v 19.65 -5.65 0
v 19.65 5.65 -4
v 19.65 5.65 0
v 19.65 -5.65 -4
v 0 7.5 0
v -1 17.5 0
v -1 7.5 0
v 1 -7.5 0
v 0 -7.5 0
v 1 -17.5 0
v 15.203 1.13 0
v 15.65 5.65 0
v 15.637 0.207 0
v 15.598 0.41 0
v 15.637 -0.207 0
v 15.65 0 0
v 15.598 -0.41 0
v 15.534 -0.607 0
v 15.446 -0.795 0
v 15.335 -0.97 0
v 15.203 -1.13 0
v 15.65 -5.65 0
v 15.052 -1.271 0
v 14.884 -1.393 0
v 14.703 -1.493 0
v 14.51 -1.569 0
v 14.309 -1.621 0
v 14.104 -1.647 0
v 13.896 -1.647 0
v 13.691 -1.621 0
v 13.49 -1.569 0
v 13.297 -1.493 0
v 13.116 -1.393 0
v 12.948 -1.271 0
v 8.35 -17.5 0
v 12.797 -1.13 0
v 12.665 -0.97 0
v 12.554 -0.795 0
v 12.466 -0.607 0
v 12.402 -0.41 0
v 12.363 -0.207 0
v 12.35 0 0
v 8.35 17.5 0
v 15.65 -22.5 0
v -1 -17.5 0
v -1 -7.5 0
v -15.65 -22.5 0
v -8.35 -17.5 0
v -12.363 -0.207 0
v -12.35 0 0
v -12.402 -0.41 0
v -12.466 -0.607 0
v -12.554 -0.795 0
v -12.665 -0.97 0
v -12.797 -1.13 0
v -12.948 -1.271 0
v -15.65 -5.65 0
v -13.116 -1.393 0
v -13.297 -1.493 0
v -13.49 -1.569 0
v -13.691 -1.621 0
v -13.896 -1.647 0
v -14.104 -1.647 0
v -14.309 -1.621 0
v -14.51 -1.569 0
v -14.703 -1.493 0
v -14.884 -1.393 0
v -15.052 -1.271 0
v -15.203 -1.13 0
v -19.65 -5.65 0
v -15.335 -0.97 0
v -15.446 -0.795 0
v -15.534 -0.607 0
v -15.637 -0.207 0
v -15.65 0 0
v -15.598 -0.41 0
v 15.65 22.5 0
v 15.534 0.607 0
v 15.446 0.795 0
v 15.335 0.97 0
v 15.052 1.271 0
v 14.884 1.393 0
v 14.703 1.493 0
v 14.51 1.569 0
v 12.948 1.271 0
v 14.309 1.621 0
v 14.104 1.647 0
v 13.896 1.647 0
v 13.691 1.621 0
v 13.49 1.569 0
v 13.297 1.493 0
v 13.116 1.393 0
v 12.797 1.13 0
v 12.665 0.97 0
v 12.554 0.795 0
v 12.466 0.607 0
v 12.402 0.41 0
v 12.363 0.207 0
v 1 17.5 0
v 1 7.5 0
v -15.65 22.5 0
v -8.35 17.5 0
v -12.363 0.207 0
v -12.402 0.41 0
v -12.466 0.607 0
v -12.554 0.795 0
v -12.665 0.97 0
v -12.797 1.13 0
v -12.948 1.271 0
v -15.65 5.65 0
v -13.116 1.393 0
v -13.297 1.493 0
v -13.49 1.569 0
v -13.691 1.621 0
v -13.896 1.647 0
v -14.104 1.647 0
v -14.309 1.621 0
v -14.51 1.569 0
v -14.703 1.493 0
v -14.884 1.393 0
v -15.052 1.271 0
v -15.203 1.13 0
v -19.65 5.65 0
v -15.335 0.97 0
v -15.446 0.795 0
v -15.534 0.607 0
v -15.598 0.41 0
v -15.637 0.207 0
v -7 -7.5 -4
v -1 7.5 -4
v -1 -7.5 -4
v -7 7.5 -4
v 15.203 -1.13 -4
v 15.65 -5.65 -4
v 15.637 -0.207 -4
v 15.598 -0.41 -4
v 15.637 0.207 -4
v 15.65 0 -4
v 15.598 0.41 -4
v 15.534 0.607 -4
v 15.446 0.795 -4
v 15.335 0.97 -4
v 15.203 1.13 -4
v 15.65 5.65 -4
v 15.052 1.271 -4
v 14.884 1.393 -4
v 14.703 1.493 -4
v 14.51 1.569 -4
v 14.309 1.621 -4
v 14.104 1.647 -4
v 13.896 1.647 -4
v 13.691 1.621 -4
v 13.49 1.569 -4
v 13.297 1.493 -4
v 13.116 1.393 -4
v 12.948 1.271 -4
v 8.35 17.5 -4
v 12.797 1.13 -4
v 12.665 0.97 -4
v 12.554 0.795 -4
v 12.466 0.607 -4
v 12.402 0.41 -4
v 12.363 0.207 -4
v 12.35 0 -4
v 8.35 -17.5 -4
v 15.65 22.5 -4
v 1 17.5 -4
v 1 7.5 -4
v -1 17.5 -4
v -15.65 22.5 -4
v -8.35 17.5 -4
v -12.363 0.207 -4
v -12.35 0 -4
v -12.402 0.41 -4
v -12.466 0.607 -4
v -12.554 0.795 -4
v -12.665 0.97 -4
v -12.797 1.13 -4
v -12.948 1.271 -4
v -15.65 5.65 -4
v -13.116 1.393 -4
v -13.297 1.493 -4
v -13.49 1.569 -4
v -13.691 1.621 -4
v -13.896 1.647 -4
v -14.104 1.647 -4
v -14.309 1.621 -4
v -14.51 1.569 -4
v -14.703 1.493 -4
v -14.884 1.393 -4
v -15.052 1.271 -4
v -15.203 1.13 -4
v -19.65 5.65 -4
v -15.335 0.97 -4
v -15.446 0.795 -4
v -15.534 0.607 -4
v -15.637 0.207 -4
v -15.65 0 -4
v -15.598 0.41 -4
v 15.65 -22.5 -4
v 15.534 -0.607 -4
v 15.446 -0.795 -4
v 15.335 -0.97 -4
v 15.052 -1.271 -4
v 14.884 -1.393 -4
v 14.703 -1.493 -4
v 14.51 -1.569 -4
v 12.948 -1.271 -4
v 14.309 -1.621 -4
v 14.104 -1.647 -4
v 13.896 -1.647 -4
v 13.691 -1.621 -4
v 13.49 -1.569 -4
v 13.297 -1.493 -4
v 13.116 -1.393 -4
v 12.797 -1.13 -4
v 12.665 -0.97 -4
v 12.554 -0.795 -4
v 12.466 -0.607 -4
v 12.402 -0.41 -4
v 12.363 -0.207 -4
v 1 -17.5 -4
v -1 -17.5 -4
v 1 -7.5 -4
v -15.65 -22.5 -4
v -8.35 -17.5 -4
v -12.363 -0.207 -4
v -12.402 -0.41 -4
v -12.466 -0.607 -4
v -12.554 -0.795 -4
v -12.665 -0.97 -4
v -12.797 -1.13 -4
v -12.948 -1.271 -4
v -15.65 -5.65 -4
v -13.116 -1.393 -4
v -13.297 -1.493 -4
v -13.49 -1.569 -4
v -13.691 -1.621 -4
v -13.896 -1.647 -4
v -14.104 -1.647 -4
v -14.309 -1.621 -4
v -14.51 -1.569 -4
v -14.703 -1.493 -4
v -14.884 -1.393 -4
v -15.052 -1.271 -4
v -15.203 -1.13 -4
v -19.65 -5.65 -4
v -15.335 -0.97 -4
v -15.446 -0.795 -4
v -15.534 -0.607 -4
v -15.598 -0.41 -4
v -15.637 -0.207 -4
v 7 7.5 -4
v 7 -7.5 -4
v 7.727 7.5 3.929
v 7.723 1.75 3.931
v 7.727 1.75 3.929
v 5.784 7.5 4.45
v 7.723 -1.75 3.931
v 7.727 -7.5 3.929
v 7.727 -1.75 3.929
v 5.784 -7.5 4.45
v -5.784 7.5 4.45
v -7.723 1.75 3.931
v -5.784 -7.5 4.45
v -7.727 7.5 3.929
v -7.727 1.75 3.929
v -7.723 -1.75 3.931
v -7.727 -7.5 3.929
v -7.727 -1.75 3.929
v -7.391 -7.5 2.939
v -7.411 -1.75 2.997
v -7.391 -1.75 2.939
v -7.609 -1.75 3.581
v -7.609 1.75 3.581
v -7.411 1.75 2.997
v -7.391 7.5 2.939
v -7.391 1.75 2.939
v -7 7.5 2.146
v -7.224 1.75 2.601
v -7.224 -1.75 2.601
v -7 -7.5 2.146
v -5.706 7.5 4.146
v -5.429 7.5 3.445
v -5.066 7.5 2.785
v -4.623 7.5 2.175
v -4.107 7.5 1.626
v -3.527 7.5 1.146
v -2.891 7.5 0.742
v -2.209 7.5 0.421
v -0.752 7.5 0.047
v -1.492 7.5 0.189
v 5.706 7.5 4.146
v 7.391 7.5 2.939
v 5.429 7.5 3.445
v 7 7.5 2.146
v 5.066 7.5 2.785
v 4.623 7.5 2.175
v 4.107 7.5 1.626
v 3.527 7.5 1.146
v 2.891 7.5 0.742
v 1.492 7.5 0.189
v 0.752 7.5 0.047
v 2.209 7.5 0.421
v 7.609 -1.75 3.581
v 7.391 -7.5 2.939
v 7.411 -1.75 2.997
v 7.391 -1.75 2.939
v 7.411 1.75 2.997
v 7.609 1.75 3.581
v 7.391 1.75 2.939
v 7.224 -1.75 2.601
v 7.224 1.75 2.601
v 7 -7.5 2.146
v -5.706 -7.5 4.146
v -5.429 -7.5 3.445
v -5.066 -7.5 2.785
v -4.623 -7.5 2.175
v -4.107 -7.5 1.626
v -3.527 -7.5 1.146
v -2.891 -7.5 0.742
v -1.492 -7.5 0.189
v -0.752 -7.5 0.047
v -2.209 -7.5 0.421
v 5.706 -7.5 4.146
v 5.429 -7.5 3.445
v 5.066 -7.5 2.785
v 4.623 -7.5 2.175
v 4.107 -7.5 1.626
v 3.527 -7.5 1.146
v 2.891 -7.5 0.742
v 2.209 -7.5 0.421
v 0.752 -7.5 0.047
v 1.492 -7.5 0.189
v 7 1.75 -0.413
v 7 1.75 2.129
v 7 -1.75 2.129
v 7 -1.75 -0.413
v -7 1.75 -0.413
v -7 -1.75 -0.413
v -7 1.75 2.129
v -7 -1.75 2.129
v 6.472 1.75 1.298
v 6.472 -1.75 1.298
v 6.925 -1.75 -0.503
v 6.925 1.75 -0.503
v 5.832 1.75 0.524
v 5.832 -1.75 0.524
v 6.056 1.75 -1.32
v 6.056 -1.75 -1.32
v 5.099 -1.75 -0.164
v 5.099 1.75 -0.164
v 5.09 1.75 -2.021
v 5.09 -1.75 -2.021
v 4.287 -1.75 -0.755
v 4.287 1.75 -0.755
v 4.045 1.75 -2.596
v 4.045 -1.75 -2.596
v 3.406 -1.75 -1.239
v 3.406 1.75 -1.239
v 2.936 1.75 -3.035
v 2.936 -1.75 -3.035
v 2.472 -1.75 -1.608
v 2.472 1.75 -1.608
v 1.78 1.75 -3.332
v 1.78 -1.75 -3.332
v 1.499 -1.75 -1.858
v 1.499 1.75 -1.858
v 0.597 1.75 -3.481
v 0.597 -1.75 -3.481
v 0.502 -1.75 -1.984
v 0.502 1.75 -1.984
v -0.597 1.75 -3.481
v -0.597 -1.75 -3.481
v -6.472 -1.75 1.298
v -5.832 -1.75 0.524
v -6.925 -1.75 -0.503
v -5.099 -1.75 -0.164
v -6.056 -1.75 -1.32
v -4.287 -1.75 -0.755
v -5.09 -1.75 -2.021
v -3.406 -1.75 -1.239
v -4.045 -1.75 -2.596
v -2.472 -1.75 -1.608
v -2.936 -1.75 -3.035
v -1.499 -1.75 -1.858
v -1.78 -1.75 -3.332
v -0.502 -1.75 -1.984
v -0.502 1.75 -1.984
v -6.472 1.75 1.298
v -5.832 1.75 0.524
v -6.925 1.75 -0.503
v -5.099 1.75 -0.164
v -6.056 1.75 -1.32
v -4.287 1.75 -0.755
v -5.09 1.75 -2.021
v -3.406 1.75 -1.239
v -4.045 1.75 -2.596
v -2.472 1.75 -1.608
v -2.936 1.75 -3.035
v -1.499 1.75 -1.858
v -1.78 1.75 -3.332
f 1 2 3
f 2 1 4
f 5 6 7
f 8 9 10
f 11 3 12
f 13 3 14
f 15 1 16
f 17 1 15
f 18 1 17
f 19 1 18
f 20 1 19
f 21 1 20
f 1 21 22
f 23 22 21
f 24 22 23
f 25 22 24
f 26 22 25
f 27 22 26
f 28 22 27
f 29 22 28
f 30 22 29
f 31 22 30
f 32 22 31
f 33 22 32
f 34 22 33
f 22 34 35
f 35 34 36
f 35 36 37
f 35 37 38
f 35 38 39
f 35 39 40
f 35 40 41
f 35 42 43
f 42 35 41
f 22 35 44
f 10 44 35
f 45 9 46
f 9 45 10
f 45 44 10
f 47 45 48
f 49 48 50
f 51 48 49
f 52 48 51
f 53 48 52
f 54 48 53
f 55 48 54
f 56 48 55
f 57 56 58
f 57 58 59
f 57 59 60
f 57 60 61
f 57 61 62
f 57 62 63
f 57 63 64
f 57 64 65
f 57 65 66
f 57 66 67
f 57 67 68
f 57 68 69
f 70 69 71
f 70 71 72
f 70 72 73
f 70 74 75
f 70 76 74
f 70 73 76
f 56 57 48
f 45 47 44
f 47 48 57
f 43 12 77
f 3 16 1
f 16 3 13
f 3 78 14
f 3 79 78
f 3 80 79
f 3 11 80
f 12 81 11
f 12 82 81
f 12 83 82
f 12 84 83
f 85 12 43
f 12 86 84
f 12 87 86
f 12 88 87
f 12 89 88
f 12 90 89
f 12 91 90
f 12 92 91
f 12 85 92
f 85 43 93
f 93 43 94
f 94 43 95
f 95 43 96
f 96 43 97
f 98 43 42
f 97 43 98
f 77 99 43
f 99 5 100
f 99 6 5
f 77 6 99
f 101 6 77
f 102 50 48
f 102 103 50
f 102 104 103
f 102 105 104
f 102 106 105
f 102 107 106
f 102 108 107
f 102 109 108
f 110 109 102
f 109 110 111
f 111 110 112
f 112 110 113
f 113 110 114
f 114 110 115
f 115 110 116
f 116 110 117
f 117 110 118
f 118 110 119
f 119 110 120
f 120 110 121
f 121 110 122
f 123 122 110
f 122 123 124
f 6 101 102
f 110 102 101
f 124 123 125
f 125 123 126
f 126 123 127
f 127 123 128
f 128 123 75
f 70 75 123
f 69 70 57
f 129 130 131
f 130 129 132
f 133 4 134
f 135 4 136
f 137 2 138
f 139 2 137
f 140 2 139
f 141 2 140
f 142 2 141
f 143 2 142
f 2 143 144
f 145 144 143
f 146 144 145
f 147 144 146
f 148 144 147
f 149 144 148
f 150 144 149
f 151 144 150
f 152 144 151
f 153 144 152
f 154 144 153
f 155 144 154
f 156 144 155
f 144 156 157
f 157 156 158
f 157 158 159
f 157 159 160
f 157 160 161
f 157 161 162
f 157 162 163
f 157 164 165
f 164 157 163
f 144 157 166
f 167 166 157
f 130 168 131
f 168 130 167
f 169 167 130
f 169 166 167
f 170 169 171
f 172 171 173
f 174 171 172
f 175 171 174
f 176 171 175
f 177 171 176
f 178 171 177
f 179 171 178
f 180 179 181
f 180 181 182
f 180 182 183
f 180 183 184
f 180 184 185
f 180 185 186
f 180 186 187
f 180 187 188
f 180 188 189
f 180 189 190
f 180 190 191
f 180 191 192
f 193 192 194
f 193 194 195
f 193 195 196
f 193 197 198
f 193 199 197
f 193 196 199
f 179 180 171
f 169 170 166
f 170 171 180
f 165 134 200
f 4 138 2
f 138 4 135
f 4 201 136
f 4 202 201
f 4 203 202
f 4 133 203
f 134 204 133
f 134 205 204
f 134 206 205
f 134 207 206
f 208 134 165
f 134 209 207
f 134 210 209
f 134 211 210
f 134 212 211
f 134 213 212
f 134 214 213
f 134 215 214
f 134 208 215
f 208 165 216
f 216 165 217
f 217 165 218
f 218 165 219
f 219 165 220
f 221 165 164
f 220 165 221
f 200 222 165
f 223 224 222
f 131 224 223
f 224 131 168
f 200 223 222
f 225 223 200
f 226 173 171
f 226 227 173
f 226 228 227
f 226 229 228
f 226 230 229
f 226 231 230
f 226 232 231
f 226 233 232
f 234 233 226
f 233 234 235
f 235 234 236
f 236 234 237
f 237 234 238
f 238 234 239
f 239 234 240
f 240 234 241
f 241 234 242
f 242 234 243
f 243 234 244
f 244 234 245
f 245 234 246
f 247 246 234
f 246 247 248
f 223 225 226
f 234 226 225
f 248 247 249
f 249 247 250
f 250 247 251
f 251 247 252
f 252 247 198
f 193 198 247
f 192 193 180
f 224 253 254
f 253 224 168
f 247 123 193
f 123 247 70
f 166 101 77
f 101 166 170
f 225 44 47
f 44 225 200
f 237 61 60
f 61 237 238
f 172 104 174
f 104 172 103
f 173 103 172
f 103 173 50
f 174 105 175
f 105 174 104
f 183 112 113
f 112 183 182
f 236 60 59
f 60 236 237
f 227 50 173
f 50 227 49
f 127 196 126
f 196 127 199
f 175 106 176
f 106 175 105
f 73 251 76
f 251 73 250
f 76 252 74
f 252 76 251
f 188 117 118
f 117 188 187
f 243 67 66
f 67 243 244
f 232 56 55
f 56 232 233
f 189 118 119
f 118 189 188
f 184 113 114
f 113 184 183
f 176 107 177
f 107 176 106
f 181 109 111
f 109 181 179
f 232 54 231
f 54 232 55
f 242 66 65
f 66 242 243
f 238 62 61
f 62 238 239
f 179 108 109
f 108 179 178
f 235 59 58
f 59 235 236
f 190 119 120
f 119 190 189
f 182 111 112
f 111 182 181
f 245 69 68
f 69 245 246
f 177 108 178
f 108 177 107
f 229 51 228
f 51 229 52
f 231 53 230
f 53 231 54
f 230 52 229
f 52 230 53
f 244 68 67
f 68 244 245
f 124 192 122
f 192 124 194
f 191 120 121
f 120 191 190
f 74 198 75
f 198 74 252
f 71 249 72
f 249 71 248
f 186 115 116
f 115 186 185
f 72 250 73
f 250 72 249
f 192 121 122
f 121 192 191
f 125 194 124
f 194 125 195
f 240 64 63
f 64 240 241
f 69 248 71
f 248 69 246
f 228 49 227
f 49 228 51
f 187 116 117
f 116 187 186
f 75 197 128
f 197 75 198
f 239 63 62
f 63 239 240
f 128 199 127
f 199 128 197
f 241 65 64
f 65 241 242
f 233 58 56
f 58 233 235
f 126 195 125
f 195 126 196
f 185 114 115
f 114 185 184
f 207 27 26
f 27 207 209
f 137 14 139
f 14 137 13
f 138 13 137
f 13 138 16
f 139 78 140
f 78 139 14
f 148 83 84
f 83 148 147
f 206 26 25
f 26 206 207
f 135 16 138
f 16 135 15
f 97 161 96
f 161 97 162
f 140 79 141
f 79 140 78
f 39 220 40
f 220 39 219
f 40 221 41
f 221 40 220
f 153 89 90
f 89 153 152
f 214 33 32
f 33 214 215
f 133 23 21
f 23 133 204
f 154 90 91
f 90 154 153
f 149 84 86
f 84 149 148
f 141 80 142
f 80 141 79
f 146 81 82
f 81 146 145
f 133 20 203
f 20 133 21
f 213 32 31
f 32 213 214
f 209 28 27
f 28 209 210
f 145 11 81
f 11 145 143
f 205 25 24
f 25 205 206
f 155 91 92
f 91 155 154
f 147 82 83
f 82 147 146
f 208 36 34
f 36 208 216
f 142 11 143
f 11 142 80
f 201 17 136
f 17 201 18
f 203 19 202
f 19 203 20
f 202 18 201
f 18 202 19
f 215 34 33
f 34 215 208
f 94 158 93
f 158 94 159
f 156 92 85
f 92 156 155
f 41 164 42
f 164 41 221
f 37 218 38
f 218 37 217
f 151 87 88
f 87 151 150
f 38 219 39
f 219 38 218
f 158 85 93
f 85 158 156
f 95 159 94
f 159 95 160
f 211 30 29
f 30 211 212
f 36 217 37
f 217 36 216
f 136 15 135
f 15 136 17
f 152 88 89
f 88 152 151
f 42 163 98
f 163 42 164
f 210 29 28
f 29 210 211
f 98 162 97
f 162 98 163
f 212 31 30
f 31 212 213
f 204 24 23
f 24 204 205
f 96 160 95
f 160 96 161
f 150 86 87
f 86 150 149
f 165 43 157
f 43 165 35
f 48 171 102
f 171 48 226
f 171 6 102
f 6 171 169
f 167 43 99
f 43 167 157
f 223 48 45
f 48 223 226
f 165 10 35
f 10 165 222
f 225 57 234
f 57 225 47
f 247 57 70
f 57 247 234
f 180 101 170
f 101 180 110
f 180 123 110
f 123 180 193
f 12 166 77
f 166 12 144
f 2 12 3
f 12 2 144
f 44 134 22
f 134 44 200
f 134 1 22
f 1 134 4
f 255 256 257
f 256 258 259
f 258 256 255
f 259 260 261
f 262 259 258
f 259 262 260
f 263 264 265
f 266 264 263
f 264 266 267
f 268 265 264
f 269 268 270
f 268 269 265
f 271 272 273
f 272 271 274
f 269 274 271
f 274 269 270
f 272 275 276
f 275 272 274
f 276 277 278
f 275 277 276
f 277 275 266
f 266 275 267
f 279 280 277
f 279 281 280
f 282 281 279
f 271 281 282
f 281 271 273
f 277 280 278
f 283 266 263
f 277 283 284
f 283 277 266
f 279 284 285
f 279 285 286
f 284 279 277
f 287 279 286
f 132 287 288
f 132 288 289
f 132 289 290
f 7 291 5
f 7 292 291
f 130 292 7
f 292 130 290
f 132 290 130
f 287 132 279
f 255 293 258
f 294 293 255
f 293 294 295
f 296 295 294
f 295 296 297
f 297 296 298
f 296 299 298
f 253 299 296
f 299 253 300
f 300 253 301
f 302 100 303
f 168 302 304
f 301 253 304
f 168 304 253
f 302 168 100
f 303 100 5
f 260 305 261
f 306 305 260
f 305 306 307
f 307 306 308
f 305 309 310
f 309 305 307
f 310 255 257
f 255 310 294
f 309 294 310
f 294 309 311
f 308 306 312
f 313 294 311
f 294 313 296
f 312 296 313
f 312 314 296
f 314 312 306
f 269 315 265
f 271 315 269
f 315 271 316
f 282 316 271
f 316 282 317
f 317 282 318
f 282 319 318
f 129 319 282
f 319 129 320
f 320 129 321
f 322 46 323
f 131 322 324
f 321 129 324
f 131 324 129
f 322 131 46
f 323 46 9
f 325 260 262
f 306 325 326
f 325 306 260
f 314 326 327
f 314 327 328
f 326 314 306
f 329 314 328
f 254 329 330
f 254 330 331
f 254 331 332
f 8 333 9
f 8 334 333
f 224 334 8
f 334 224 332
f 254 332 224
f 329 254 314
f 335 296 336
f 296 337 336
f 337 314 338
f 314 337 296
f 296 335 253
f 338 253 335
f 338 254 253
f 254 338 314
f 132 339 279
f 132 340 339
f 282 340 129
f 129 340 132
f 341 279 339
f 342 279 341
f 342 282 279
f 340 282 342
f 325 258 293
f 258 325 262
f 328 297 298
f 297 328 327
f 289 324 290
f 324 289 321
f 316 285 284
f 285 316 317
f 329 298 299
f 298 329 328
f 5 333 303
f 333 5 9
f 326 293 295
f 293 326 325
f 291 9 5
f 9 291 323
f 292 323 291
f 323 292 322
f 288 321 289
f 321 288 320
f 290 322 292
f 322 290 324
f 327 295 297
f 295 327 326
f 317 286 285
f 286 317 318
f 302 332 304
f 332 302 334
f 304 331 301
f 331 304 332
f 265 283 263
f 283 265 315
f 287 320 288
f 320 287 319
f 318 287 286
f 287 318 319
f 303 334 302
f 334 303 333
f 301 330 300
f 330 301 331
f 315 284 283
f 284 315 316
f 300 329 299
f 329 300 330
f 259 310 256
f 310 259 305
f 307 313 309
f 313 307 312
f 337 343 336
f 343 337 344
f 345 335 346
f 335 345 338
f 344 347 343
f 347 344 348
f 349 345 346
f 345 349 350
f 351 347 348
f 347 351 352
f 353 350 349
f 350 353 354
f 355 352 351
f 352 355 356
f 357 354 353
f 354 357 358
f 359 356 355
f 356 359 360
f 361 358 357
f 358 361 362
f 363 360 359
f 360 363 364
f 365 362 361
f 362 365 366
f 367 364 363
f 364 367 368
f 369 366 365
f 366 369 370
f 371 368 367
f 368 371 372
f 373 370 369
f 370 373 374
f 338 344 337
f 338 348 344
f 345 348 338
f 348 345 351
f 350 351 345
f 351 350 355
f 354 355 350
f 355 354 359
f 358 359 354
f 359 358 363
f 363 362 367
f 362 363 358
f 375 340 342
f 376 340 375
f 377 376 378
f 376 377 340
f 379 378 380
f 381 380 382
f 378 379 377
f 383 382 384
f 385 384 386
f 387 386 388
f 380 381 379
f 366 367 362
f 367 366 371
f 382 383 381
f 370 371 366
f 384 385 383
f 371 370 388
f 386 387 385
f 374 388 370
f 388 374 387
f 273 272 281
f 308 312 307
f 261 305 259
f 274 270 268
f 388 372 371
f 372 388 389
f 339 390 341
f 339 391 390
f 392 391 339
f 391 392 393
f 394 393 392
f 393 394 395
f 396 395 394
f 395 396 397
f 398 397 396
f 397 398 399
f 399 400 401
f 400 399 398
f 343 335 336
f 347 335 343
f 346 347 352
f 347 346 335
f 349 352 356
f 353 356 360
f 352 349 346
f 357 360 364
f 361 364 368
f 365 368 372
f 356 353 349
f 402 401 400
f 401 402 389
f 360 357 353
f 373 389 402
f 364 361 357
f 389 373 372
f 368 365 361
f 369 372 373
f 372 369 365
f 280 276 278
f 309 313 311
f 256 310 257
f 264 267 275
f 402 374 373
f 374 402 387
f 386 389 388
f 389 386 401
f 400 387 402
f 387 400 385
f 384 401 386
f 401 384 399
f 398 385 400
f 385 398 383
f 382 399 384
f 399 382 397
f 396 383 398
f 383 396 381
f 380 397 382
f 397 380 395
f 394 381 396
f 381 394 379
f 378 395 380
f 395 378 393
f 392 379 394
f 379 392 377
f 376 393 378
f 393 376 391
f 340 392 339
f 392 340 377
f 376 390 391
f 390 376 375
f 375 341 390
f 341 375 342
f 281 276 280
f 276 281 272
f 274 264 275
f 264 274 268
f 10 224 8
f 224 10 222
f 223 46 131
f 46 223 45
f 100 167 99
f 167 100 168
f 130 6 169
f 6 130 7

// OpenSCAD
// file: clamp.scad
//Klammer - Variablen
//wandstaerke=2;
//d_bushing=12;
//d_bushing_corr =0.5; // Korrektur für die lockere Öffnung;
//h_bushing=15;

oeffnung_geschlossen=90; //Winkel der öffnung
oeffnung_offen=210;

//Klammer (unrotiert)
module clamp_u(wandstaerke,d_bushing,h_bushing, basis_h, oeffnung) {
        difference(){
            union(){
                //Klammer
                rotate([0,0,oeffnung/2]){
                rotate_extrude(angle = 360-oeffnung){
                    square([wandstaerke+d_bushing/2,h_bushing]);
                }
                }
                //Basis
                b_breite = d_bushing+wandstaerke;
                b_lange = h_bushing;
                b_hoehe = d_bushing/2+basis_h;
                translate([-b_hoehe-wandstaerke,-b_breite/2,0]){
                    cube([b_hoehe, b_breite, b_lange]);
                } 
      
            }
            //Loch
            cylinder(d1=d_bushing,d2=d_bushing,h=h_bushing);
        }
}

module clamp(wandstaerke,d_bushing,h_bushing, basis_h, oeffnung, center){
    if(center== true) {
        translate([0,-h_bushing/2,+d_bushing/2+wandstaerke+basis_h]){ rotate([0,-90,-90]) {
            clamp_u(wandstaerke, d_bushing, h_bushing,basis_h, oeffnung_offen, ct);
        }}
    } 
    else {
        translate([0,d_bushing/2+wandstaerke/2,-d_bushing/2-wandstaerke-basis_h]){ rotate([0,90,0]) {
            clamp_u(wandstaerke, d_bushing, h_bushing,basis_h, oeffnung_offen, ct);
        }}
    }
}

//Aussparung (unrotiert)
module ct_aussparung_u(wandstaerke, d_bushing, h_bushing, ct){
    // Aussparung
    a_lange = 180;
    a_breite = ct[1];
    a_tiefe = ct[0];
    //Klammer
    translate([0,0,-a_breite/2 + h_bushing/2]){
        rotate([0,0,90]) {
            rotate_extrude(angle = 180){
                translate([d_bushing/2 + wandstaerke, 0]){
                    square([a_tiefe,a_breite]);
                }
            }
        }
       
    }    
}

//Aussparung 
module ct_aussparung(wandstaerke, d_bushing, h_bushing,basis_h, ct){
    if(center == true) {
         translate([0,-h_bushing/2,+d_bushing/2+wandstaerke+basis_h]){ rotate([0,-90,-90]) {
            ct_aussparung_u(wandstaerke, d_bushing, h_bushing, ct);
        }}
    } 
    else {
        translate([d_bushing/2+wandstaerke/2,0,d_bushing/2+wandstaerke+basis_h]){ rotate([0,-90,-90]) {
            ct_aussparung_u(wandstaerke, d_bushing, h_bushing, ct);
        }}
    }
}

//Klammer mit Kabelbinder-Aussparung (unrotiert)
module clamp_with_ct_u(wandstaerke,d_bushing,h_bushing,basis_h, oeffnung,ct) {
    difference(){
        clamp_u(wandstaerke, d_bushing, h_bushing,basis_h, oeffnung);
        ct_aussparung_u(wandstaerke, d_bushing, h_bushing, ct);
    }
}



module clamp_with_ct(wandstaerke,d_bushing,h_bushing, basis_h, oeffnung, ct, center=false){
    if(center == true) {
         translate([0,-h_bushing/2,+d_bushing/2+wandstaerke+basis_h]){ rotate([0,-90,-90]) {
            clamp_with_ct_u(wandstaerke, d_bushing, h_bushing,basis_h, oeffnung_offen, ct);
        }}
    } 
    else {
        translate([d_bushing/2+wandstaerke/2,0,d_bushing/2+wandstaerke+basis_h]){ rotate([0,-90,-90]) {
            clamp_with_ct_u(wandstaerke, d_bushing, h_bushing, basis_h, oeffnung_offen, ct);
        }}
    }
}
// main file
$fn=50;

include <clamp.scad>;


//Schraubenabstand
s_abstand=28;

//Schrauben M3 Konstanten
d_m3=3.3; 
h_m3=15;

//Schrauben M4 Konstaten
d_m4=4.3;
h_m4=15;

//Schrauben Maße
d_s = d_m3; //Durchmesser
h_s= h_m3;

lochstaerke = 4;

//Maße Grundplatte
gr_x=s_abstand +lochstaerke*2+d_s;
gr_y=45;
gr_z=4;

//Kabelbinder Maße
ct_x=1.5; //Dicke
ct_y=3.5; //Breite
ct_z=gr_z+3; //Länge / Flexibilität
ct=[ct_x, ct_y, ct_z];

//Klammer
wandstaerke=2;
d_bushing=12;
d_bushing_corr =0.5; // Korrektur für die lockere Öffnung;
h_bushing=15;


//Federsteg
steg_y = gr_y-10; //Länge
steg_z = gr_z; //So dick wie die Platte
steg_x = 2; // Dicke



//Basisplatte
difference() {
    //Platte
    translate([-gr_x/2, -gr_y/2, -gr_z]) {
        cube([gr_x, gr_y, gr_z]);
    }
    
    //Schraubenlöcher
    translate([-s_abstand/2,0,-h_s]){
        cylinder(d1=d_s, d2=d_s, h=h_s);
    }
    translate([s_abstand/2,0,-h_s]){
        cylinder(d1=d_s, d2=d_s, h=h_s);
    }
    
    //Federaussparung
    gr_fx = s_abstand-d_s-2*lochstaerke;
    gr_fy = steg_y;
    gr_fz = gr_z;
    translate([-gr_fx/2, -gr_fy/2, -gr_fz]) {
        cube([gr_fx, gr_fy, gr_fz]);
    }
    
    //Eckenaussparung (Material sparen)
    gr_ex = lochstaerke;
    gr_ey = (gr_y-d_s)/2 - lochstaerke;
    gr_ez = gr_z;
    
    translate([-gr_x/2,-gr_y/2,-gr_z]) {
        cube([gr_ex, gr_ey, gr_ez]);
    }
    
    translate([-gr_x/2,gr_y/2-gr_ey,-gr_z]) {
        cube([gr_ex, gr_ey, gr_ez]);
    }
    translate([gr_x/2-gr_ex,gr_y/2-gr_ey,-gr_z]) {
        cube([gr_ex, gr_ey, gr_ez]);
    }
    translate([gr_x/2-gr_ex,-gr_y/2,-gr_z]) {
        cube([gr_ex, gr_ey, gr_ez]);
    }
   
}
 


//Klammer
translate([0,0,-gr_z]){
    clamp_with_ct(wandstaerke, d_bushing, h_bushing,gr_z-wandstaerke, oeffnung_offen, ct, center=true);
}

//Federsteg
translate([-steg_x/2,-steg_y/2,-gr_z]) {
        cube([steg_x, steg_y/2 - h_bushing/2, steg_z]);
}

translate([-steg_x/2,h_bushing/2,-gr_z]) {
        cube([steg_x, steg_y/2 - h_bushing/2, steg_z]);
}
